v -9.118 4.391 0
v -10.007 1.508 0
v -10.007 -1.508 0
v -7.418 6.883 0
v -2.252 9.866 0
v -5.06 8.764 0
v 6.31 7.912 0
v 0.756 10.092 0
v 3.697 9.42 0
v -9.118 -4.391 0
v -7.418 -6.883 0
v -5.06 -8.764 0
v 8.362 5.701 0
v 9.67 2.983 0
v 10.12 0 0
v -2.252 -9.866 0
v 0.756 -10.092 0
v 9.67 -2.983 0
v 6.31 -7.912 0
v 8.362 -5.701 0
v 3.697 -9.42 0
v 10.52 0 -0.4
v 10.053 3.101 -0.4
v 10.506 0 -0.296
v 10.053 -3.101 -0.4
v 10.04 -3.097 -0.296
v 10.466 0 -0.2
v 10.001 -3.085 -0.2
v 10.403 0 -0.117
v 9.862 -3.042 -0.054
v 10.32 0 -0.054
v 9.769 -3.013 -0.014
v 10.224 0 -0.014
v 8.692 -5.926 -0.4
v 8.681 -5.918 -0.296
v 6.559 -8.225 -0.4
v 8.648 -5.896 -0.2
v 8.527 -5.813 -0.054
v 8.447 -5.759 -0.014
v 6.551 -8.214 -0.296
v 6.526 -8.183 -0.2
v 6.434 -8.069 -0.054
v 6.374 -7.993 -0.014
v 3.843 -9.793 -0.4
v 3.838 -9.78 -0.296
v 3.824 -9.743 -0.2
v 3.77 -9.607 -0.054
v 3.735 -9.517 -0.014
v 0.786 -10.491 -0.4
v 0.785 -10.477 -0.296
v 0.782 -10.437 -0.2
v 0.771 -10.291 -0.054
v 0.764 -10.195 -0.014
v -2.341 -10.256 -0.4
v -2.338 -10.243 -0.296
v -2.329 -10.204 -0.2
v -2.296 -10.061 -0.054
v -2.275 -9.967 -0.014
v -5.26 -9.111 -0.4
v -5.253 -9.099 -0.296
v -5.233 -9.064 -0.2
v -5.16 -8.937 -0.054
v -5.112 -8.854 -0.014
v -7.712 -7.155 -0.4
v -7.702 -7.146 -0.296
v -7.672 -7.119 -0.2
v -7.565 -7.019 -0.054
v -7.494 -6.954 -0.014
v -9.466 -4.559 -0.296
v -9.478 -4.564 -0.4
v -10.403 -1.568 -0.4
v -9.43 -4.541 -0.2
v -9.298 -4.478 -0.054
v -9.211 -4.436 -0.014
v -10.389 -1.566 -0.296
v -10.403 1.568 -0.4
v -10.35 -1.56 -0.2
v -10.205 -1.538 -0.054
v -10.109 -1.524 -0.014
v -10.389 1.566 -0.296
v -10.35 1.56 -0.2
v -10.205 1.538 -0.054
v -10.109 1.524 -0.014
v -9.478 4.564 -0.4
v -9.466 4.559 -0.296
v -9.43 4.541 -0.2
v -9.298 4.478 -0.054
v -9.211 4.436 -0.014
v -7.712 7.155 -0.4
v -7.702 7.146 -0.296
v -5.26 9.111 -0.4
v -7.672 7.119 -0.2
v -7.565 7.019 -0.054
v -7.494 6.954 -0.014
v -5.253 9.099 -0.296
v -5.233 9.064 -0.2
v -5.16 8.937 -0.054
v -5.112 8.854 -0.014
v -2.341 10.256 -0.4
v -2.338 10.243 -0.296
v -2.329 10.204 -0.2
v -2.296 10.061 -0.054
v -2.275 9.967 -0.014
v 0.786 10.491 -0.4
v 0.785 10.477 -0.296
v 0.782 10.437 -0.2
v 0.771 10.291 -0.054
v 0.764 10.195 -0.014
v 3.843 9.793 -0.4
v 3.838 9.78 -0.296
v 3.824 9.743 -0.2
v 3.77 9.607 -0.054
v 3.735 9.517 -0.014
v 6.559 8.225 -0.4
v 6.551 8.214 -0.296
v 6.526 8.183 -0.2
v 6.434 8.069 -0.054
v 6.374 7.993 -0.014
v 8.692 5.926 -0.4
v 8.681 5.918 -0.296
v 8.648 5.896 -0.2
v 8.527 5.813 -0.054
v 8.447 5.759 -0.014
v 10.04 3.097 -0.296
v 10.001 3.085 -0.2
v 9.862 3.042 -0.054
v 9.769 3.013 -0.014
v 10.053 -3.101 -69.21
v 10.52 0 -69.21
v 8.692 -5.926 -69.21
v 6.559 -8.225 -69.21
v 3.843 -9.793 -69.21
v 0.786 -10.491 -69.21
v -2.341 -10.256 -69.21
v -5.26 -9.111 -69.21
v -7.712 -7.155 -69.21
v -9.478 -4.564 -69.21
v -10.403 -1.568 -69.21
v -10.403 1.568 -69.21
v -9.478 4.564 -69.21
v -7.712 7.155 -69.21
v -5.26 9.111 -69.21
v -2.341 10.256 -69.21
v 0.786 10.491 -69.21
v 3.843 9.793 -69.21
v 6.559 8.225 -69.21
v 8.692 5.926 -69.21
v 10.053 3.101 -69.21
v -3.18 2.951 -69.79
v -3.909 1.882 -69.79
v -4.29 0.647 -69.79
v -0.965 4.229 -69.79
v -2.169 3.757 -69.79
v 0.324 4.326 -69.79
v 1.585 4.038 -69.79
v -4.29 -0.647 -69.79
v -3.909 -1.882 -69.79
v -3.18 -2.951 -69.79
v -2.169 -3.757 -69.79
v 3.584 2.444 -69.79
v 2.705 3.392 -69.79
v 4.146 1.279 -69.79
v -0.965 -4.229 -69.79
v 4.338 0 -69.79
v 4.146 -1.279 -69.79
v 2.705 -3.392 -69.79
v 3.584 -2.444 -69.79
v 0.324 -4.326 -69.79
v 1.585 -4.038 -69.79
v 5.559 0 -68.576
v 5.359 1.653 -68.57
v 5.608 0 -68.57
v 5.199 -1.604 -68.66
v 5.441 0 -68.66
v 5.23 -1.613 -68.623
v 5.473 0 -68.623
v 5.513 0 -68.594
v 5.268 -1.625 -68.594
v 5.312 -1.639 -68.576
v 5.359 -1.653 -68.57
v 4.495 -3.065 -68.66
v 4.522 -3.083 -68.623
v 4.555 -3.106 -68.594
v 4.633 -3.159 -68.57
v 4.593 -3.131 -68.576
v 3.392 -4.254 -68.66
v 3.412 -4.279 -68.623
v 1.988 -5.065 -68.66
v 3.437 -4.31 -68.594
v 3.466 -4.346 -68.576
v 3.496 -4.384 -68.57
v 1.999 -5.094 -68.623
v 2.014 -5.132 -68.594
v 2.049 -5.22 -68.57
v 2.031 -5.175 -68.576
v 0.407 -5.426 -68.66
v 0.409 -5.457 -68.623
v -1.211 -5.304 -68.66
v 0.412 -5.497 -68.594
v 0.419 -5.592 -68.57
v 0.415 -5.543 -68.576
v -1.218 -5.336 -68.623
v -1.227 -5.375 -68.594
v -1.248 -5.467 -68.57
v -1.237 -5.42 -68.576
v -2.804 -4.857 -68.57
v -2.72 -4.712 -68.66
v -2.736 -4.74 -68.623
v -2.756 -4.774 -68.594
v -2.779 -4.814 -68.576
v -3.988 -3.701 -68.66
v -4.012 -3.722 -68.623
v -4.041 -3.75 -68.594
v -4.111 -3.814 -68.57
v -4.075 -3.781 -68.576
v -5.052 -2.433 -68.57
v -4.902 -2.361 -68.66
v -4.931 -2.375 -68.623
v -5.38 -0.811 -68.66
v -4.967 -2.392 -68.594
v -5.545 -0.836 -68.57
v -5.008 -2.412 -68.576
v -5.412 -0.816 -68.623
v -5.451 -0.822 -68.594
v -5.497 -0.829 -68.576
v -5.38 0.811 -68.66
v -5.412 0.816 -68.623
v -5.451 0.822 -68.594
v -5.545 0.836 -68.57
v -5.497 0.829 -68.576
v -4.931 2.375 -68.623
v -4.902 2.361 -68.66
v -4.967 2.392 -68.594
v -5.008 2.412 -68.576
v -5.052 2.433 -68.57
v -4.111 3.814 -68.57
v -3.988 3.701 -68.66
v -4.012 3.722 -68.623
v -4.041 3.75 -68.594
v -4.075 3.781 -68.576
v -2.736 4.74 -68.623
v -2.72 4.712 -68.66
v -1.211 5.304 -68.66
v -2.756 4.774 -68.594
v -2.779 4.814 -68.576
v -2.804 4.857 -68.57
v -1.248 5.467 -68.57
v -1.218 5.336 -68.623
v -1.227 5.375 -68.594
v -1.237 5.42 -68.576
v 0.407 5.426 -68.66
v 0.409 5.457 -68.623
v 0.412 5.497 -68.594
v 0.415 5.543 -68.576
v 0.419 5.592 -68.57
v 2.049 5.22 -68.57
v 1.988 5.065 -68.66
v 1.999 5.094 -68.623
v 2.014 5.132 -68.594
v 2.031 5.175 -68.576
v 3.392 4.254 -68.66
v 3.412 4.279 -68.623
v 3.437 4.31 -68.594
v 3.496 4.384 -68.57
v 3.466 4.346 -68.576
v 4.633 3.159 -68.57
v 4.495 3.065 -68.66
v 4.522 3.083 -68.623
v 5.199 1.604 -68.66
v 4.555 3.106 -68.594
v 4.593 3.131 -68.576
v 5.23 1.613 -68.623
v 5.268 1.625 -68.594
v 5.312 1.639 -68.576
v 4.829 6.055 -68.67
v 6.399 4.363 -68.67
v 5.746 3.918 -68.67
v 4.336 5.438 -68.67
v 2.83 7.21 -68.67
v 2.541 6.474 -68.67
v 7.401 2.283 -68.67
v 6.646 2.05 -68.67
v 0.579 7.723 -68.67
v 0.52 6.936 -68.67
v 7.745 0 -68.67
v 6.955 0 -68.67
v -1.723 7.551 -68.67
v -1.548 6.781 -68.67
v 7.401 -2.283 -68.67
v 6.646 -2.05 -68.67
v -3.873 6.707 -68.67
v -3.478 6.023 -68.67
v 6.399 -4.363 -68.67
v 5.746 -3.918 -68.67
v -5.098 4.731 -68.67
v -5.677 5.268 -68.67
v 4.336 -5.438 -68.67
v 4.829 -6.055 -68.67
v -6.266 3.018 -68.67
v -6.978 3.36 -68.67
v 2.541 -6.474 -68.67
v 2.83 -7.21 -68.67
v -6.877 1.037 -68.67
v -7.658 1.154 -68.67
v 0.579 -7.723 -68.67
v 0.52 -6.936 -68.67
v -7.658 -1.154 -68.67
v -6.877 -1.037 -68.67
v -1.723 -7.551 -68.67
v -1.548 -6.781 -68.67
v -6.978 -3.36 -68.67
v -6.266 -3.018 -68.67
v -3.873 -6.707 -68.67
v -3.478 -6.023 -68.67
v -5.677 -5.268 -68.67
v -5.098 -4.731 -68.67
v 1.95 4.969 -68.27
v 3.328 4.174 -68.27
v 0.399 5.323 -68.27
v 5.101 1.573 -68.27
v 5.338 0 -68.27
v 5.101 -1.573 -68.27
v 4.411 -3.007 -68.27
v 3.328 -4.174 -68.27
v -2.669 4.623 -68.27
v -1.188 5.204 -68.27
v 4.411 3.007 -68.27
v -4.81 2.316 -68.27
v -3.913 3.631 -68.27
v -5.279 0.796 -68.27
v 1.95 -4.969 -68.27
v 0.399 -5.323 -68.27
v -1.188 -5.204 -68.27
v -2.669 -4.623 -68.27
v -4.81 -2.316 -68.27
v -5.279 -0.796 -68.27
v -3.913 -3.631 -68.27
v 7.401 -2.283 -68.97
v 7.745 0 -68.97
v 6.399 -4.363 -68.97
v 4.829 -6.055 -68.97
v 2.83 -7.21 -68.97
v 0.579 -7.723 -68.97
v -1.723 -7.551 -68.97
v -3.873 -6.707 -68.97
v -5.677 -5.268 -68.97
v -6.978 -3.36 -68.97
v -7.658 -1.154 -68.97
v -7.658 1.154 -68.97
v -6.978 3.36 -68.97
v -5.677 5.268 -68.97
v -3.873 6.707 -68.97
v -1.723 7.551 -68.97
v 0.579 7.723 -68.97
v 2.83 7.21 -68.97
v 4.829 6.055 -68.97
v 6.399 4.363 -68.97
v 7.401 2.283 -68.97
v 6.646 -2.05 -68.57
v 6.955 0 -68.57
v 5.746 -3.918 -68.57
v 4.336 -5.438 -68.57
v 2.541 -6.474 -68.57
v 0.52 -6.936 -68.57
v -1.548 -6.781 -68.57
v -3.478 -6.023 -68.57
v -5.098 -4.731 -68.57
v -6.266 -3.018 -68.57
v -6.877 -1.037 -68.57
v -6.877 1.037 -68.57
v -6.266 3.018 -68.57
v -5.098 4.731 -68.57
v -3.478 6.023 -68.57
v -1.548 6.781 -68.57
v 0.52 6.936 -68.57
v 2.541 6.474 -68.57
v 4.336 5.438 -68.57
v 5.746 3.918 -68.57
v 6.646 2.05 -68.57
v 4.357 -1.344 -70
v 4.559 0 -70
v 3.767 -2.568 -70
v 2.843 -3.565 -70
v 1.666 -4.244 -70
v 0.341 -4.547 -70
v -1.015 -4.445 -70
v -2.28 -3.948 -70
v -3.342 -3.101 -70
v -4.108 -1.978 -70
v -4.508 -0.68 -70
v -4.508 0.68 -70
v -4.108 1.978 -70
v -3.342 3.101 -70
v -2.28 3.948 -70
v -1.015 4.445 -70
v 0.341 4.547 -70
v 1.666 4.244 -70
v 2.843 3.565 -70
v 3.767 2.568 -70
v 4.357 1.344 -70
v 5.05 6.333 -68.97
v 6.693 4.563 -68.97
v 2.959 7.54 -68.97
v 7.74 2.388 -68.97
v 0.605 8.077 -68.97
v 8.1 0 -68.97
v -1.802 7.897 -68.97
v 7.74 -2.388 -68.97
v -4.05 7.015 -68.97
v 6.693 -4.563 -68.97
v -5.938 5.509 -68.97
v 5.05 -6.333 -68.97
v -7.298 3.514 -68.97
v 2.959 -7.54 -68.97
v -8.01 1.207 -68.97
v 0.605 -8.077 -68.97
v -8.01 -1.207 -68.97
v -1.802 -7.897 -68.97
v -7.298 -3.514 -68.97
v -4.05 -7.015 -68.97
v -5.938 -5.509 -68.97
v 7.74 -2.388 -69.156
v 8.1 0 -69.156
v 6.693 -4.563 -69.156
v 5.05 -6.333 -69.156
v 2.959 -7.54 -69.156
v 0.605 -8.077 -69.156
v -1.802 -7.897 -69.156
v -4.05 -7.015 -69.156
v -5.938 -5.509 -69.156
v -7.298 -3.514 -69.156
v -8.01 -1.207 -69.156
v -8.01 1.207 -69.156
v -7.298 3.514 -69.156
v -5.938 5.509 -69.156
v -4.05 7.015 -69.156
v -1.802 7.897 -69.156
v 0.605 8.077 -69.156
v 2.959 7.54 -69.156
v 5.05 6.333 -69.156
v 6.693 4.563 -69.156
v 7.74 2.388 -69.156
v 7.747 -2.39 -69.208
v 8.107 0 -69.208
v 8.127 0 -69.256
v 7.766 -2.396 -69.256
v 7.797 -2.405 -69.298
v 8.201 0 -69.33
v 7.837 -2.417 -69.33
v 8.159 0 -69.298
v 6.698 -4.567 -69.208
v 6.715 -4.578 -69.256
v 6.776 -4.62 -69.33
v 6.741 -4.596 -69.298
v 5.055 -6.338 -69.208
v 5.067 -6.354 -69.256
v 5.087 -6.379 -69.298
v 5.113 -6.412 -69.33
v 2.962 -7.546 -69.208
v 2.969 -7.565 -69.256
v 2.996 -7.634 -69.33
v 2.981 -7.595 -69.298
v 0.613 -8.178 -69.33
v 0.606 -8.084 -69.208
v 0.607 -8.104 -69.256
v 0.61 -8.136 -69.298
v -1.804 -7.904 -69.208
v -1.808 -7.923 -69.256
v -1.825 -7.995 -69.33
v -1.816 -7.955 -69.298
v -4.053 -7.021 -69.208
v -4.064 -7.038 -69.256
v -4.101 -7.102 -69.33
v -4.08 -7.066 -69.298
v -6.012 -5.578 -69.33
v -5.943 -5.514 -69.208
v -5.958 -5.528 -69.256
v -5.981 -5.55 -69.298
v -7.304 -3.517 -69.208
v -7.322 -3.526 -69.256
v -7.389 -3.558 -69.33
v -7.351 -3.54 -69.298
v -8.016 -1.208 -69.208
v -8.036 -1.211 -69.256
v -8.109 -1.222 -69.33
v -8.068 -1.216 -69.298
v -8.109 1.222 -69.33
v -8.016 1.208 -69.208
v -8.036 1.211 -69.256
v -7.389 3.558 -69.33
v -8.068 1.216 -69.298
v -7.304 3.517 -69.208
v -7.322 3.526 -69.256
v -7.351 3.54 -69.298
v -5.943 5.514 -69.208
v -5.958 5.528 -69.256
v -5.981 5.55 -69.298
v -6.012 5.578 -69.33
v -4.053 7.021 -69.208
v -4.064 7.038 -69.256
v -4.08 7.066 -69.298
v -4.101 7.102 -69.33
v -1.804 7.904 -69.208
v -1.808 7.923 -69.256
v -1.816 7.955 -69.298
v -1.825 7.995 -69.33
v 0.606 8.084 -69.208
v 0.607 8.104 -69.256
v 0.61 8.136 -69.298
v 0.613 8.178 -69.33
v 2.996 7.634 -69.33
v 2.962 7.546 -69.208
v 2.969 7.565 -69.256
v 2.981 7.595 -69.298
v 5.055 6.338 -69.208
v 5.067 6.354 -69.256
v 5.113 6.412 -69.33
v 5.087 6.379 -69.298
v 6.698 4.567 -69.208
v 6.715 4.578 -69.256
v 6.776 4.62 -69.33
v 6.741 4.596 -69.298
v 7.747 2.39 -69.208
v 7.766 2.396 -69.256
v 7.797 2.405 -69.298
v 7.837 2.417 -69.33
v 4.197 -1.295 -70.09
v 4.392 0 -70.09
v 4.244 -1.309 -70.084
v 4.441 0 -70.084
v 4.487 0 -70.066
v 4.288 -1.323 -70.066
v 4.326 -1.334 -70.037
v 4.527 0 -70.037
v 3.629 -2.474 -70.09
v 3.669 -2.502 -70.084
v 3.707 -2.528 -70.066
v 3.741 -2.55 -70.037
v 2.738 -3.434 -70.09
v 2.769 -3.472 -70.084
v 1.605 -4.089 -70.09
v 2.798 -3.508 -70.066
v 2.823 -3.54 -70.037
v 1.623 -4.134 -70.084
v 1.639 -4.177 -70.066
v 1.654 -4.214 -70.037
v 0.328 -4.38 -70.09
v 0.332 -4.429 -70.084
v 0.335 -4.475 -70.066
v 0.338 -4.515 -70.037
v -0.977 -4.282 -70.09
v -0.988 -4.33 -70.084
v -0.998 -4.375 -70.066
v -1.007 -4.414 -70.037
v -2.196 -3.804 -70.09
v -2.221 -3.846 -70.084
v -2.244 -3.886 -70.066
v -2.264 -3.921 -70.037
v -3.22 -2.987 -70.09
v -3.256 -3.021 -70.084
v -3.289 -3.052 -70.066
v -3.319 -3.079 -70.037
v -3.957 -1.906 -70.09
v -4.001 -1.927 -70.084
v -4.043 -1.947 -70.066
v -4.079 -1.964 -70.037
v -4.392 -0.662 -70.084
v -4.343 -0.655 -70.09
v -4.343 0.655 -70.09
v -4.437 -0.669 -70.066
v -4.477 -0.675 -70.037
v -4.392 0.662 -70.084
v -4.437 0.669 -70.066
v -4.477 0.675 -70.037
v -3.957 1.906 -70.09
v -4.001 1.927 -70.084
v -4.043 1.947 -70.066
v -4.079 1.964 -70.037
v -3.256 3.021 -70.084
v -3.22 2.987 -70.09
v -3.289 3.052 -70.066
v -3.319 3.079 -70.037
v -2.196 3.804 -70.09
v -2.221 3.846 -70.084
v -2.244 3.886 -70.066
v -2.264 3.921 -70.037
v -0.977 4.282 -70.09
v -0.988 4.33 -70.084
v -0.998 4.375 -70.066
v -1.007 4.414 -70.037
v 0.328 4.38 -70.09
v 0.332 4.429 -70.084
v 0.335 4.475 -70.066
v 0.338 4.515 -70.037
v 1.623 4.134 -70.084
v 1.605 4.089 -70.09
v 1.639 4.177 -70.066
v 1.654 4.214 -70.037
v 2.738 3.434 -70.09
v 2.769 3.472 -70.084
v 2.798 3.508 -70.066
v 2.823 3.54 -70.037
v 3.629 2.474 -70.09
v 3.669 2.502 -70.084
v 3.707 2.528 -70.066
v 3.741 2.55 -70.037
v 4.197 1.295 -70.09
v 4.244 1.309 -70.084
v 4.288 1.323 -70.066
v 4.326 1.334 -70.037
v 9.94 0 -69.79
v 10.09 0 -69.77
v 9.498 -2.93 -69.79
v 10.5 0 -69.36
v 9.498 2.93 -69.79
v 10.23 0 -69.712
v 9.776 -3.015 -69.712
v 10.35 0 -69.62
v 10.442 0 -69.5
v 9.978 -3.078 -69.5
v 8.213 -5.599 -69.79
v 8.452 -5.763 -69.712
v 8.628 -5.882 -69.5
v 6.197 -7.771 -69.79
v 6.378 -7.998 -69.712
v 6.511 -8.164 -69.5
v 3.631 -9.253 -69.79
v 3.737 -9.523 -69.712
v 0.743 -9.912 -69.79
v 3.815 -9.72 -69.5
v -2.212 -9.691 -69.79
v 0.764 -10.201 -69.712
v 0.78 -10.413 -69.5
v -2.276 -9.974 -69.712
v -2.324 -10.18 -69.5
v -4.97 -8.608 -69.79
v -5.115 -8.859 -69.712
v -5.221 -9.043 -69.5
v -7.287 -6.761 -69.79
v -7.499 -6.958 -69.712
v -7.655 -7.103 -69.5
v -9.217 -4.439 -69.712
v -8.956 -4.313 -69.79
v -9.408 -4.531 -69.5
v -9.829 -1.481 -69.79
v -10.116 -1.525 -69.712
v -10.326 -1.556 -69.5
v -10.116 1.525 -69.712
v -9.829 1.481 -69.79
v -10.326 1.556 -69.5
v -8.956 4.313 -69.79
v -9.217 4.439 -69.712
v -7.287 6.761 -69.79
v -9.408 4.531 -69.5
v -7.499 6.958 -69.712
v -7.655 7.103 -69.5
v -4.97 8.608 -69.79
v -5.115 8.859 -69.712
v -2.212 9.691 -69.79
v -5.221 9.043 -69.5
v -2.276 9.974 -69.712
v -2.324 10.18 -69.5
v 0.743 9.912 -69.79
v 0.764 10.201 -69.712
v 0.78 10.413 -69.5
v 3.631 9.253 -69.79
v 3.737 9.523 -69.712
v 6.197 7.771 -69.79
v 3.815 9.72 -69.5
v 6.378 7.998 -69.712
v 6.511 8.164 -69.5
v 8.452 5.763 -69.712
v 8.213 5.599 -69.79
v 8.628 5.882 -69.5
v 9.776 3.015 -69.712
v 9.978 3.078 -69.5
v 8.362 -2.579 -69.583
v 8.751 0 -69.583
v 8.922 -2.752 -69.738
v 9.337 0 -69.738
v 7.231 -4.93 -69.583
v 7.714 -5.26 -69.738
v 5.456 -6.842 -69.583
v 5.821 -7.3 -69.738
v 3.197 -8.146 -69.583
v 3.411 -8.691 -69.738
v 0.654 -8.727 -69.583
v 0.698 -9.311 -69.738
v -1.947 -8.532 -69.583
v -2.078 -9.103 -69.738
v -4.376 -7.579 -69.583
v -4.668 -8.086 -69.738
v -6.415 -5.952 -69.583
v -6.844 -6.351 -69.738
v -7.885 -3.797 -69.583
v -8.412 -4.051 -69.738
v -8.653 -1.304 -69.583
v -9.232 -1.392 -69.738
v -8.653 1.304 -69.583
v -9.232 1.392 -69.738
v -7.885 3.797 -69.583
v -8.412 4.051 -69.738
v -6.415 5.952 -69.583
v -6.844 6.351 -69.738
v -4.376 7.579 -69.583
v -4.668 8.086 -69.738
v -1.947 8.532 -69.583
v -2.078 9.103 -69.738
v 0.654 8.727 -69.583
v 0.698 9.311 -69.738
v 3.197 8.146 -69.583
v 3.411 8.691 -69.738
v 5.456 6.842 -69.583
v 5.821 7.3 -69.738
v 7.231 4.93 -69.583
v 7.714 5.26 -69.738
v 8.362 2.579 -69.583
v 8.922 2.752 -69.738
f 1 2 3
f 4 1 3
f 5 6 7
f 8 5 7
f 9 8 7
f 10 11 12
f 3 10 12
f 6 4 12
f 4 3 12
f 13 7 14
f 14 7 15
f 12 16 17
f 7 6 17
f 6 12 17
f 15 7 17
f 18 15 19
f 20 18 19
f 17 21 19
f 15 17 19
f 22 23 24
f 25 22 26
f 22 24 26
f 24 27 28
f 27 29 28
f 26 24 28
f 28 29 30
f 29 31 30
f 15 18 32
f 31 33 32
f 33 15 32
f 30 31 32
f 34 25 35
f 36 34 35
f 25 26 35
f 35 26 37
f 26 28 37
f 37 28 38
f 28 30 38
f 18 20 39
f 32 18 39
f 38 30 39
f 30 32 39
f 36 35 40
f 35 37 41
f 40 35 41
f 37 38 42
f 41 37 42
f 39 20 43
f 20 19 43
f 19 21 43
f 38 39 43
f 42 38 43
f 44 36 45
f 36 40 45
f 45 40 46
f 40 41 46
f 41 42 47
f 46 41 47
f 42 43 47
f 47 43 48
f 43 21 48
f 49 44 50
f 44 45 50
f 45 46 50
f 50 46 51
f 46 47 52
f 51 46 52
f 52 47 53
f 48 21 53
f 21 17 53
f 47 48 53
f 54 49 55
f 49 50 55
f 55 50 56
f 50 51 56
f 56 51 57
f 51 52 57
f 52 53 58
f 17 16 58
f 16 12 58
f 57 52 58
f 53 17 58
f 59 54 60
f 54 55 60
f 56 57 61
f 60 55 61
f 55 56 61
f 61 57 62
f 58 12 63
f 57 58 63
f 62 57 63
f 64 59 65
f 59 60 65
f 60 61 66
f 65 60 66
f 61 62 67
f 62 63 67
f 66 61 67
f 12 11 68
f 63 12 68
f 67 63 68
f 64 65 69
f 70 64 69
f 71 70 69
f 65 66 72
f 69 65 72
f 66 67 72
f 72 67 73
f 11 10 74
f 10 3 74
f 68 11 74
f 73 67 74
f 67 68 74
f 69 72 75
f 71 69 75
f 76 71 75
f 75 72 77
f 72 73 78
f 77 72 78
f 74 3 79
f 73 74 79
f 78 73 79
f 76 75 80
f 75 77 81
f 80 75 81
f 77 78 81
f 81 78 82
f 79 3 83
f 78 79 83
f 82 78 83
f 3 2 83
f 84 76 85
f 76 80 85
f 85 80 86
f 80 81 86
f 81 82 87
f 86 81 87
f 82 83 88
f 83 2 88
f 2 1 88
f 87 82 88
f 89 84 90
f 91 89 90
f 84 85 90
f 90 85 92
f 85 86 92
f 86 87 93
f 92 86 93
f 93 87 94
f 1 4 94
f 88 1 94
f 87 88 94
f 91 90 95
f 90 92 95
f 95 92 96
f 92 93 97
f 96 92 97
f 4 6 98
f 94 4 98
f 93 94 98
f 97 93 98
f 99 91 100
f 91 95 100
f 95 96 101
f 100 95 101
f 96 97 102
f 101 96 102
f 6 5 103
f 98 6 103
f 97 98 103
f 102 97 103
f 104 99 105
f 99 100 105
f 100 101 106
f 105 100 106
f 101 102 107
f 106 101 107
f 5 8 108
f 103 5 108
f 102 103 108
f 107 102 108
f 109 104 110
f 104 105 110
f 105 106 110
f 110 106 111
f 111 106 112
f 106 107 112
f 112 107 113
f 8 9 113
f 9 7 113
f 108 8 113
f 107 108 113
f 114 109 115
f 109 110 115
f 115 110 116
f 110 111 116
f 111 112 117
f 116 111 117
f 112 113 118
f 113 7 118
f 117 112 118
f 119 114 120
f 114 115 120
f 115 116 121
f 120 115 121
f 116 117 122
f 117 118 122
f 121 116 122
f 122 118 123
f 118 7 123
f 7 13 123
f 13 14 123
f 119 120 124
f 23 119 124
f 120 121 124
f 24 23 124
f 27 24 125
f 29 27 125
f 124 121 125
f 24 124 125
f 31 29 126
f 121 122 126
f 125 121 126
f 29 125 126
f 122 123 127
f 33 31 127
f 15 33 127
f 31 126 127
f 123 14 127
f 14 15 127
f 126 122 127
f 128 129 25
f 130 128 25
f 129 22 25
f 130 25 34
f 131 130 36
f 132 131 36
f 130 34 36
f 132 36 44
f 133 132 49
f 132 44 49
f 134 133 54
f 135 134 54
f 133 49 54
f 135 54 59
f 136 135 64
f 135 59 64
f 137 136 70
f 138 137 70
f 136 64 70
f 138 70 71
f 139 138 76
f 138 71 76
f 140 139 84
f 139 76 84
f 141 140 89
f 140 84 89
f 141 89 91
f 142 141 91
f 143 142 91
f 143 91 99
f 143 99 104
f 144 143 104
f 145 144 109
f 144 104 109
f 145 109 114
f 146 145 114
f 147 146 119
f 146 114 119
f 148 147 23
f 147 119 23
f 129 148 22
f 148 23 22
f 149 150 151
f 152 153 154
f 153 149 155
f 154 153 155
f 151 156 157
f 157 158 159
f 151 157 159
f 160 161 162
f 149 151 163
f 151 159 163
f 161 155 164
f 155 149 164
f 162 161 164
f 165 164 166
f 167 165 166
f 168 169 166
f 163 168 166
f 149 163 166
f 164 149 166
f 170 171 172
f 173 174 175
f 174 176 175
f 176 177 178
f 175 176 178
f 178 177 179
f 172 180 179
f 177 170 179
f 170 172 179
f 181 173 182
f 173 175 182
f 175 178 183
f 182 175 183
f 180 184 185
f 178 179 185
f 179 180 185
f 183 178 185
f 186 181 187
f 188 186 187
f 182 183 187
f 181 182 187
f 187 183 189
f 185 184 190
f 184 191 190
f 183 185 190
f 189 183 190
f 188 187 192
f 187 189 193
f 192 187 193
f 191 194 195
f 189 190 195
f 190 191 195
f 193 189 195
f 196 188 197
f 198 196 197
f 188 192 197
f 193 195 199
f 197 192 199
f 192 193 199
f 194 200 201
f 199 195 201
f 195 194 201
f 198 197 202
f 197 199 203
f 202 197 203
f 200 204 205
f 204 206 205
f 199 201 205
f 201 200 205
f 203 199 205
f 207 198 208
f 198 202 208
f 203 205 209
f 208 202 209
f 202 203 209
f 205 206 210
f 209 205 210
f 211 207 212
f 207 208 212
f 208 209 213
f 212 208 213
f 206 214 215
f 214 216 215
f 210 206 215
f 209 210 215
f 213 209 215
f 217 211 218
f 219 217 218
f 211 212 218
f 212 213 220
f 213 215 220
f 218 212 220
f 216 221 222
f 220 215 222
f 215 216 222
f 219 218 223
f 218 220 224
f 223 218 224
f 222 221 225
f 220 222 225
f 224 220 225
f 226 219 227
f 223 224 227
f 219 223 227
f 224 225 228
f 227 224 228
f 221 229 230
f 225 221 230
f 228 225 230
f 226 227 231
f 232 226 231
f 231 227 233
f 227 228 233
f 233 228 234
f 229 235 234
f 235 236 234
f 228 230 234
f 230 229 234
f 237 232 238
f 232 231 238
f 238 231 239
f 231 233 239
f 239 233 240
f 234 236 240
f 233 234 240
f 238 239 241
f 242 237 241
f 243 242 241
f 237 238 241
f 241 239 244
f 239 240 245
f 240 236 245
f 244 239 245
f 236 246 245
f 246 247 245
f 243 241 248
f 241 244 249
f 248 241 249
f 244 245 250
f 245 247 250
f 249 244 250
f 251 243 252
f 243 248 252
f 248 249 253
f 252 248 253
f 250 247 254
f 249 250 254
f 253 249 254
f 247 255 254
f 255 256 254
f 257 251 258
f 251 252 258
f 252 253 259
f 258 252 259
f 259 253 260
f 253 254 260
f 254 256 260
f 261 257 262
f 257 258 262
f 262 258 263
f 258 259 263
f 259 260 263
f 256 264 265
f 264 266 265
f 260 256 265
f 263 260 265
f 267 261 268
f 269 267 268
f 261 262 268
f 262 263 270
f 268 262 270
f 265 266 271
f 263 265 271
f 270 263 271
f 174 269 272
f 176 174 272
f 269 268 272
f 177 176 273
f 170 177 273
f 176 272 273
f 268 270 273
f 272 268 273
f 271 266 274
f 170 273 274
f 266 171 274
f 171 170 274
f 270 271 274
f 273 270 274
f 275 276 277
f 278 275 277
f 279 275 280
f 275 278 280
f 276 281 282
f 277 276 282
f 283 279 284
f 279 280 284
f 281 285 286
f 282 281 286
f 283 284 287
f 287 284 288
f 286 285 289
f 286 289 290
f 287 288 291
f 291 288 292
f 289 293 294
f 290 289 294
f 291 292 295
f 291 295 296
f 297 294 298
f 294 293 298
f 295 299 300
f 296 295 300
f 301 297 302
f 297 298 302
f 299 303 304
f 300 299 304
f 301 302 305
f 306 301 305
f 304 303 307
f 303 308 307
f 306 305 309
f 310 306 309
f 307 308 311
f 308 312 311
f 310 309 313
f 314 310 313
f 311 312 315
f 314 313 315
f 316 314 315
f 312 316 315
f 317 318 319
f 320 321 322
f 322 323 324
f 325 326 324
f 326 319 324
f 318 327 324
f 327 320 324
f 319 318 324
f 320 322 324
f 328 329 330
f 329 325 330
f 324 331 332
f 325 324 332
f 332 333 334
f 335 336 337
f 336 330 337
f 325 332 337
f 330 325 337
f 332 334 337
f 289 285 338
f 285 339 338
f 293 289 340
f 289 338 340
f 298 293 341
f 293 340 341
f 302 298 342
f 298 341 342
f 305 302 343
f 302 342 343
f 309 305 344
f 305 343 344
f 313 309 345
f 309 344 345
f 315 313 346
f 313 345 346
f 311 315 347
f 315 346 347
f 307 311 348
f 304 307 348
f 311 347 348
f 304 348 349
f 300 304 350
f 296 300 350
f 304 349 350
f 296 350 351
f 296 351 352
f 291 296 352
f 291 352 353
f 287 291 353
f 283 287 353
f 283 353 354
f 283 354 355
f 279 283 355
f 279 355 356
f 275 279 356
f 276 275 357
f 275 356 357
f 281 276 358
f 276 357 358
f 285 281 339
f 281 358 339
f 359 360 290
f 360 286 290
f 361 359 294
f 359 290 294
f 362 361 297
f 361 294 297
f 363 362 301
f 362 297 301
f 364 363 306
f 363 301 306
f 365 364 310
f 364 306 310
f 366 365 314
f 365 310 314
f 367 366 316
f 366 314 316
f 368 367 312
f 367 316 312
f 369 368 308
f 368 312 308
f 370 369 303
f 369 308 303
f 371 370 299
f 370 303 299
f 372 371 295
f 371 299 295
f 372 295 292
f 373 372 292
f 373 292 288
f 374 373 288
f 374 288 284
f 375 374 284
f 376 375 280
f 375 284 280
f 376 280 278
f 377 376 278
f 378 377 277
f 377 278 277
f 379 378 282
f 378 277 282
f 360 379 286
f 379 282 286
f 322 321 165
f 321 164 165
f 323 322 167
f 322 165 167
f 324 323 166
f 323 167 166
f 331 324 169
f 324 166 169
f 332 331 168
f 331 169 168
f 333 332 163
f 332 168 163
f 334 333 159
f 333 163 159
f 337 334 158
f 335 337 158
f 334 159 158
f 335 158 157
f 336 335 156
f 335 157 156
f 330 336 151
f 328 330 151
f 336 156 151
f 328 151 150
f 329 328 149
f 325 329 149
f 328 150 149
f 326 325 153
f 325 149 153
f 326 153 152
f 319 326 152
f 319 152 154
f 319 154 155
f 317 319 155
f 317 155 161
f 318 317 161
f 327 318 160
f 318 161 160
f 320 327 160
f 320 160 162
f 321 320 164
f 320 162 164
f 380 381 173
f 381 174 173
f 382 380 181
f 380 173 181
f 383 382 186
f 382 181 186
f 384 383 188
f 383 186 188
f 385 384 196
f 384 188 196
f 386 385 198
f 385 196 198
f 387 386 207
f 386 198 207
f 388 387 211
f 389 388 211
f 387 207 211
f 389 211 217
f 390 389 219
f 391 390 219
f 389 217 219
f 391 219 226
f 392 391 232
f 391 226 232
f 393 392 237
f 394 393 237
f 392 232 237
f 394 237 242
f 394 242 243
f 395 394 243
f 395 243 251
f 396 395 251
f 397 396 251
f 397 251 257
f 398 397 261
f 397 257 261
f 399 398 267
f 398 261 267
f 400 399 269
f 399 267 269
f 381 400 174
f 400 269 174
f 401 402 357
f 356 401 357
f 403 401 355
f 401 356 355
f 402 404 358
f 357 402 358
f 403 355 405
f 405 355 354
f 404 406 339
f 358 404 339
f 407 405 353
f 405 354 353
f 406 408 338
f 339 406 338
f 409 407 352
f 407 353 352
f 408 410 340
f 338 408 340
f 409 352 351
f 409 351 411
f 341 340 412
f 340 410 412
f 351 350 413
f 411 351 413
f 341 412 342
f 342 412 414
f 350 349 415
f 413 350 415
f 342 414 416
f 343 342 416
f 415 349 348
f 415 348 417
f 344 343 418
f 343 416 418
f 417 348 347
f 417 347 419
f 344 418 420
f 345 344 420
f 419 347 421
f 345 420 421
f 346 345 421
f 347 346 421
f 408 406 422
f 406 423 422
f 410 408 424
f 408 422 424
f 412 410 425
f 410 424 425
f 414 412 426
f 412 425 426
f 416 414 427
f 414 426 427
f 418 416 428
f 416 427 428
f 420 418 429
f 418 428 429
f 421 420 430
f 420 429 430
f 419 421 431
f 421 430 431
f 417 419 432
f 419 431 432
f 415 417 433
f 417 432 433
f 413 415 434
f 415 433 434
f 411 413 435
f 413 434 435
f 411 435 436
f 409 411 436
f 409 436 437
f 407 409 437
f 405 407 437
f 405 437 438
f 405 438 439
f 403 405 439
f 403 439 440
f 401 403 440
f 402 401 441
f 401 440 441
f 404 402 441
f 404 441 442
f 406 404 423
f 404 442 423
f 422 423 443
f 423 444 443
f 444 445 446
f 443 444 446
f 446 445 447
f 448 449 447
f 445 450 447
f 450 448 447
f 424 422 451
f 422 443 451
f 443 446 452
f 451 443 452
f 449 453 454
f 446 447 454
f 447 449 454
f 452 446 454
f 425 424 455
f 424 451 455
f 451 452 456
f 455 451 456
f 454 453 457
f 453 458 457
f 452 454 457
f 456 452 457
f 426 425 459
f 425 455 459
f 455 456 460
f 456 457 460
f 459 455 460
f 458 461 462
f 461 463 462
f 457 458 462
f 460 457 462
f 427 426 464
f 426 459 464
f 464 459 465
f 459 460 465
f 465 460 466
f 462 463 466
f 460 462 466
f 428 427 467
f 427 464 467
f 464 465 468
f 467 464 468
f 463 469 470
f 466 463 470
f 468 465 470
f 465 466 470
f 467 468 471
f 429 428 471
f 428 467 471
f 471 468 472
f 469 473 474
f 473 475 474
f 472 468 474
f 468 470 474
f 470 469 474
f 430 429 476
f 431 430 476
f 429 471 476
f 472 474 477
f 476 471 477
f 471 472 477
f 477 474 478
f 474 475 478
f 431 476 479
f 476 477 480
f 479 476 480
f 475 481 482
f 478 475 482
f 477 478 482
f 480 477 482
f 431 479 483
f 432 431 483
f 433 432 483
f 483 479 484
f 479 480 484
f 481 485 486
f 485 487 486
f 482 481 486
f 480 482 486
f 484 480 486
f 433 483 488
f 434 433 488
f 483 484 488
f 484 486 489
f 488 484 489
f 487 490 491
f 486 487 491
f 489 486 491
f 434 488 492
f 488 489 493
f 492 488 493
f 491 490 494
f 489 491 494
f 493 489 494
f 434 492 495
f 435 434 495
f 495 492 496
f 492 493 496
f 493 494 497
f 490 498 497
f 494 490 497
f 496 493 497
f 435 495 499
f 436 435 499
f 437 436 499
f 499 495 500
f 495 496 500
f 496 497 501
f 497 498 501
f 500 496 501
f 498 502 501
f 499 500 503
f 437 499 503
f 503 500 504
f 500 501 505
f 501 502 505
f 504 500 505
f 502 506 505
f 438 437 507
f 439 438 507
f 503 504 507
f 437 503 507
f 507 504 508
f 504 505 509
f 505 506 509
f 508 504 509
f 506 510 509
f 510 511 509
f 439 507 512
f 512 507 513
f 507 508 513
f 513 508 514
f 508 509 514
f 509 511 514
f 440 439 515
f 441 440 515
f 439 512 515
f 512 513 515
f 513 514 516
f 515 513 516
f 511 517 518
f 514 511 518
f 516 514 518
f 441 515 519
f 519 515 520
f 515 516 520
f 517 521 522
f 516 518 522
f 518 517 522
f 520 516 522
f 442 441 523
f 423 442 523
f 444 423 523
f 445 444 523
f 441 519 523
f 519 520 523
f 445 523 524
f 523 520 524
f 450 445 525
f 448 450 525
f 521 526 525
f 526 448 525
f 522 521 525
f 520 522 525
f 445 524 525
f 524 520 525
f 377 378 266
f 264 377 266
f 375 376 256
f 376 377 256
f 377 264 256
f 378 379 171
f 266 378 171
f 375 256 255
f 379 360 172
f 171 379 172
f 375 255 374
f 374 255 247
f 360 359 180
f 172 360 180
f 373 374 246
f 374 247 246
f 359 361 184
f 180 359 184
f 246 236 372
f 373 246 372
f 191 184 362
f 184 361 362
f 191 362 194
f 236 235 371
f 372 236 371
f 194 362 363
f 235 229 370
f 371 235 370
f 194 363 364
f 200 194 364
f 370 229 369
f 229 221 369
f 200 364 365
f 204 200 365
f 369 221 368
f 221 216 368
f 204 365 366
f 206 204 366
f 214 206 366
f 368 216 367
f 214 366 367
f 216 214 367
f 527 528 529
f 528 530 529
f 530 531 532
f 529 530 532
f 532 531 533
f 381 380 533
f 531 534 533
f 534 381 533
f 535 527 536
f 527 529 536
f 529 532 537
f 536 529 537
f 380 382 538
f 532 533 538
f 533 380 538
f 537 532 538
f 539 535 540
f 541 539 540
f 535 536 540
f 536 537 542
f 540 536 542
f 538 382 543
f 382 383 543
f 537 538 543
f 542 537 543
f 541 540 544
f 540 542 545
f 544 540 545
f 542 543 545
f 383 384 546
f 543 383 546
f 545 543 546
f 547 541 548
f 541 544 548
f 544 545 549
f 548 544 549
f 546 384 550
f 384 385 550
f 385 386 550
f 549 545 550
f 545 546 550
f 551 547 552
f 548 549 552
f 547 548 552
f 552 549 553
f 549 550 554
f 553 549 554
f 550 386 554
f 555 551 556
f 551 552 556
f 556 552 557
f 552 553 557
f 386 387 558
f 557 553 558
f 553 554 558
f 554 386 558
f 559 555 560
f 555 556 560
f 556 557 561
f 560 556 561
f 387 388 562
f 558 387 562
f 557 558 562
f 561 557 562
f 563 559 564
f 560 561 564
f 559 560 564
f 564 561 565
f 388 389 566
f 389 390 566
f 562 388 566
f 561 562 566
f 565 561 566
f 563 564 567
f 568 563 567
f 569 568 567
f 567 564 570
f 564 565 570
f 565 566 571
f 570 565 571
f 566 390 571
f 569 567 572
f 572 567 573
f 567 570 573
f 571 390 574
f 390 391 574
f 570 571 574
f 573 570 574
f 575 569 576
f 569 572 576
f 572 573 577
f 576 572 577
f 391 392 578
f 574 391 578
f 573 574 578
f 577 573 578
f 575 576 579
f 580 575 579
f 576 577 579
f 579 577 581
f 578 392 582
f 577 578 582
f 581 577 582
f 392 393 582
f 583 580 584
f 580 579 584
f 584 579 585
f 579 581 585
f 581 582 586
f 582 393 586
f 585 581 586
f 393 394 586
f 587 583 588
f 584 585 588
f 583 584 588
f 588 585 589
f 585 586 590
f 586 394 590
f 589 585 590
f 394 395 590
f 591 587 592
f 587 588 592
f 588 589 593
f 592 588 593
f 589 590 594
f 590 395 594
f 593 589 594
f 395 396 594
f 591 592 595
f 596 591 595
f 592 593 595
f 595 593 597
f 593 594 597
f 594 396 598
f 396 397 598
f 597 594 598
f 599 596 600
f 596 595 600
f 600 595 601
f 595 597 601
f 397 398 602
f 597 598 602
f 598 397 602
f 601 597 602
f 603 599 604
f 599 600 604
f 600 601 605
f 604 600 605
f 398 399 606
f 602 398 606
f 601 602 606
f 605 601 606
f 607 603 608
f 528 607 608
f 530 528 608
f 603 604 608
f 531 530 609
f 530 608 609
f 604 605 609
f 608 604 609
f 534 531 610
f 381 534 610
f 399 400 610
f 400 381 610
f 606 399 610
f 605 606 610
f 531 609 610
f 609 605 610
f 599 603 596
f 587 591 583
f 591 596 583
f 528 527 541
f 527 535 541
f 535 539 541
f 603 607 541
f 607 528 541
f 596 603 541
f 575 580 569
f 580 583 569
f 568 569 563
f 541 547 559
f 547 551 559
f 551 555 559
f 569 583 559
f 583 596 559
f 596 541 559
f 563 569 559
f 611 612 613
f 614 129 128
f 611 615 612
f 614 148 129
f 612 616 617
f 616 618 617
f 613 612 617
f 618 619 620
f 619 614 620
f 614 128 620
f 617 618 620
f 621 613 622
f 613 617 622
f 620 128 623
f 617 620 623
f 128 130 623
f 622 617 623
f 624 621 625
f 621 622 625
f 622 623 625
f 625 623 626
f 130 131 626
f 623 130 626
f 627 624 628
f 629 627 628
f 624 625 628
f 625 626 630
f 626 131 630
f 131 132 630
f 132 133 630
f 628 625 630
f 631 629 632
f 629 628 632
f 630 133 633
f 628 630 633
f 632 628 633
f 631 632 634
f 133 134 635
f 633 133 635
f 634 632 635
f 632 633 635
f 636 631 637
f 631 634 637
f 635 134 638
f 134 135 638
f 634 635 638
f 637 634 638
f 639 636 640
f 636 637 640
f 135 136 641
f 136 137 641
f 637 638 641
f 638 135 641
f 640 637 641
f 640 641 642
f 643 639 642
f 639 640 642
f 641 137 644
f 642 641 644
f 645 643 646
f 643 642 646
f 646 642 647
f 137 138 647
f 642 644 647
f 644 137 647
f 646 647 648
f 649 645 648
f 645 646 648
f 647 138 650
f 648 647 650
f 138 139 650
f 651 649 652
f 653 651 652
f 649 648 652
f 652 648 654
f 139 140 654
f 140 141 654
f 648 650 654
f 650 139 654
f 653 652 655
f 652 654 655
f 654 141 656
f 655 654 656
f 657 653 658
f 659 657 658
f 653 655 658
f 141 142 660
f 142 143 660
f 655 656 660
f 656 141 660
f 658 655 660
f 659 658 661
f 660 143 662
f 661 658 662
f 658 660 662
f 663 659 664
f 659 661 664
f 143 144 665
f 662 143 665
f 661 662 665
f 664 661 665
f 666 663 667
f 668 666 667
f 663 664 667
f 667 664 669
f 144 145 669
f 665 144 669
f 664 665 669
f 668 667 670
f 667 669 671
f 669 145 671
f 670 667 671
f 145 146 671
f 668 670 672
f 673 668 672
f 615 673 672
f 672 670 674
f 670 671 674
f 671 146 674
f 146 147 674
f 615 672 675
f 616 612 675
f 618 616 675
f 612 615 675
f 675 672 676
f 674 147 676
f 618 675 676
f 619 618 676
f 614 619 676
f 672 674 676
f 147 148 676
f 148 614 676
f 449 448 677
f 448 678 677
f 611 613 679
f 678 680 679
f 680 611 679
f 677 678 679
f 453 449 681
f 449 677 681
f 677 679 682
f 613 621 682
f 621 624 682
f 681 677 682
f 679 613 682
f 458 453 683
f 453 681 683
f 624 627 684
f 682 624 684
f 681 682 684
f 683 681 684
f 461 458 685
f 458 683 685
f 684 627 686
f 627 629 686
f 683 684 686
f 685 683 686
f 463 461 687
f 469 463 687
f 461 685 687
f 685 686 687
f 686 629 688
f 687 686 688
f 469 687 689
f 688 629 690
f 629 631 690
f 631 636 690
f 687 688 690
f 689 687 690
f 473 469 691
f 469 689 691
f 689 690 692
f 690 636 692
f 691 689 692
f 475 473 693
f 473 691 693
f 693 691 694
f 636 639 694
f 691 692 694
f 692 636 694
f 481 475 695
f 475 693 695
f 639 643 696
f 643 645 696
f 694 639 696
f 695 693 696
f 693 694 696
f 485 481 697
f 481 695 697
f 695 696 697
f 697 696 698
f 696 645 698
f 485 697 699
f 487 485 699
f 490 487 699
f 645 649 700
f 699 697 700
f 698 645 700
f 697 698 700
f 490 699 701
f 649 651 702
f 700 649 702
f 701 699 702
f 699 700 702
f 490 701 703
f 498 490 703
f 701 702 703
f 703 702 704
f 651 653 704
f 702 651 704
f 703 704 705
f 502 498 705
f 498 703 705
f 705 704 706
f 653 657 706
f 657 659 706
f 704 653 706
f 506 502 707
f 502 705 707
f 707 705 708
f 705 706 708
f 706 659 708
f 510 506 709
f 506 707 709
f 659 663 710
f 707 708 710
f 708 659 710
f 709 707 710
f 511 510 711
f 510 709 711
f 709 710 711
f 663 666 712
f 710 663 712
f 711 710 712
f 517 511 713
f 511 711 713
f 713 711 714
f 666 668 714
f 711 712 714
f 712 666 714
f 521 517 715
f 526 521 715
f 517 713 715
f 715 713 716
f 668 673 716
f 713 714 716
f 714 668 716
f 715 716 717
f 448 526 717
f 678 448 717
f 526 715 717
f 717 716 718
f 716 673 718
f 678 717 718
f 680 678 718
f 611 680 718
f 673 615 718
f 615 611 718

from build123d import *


with BuildPart() as part:
    # Sketch1 → Revolve1 (revolve)
    with BuildSketch(Plane(origin=(0, 0, 0), x_dir=(1, 0, 0), z_dir=(0, 1, 0))):
        with BuildLine():
            Line((0, 70.09), (4.39217757, 70.09))
            ThreePointArc((4.39217757, 70.09), (4.487086316, 70.066046386), (4.559260987, 69.9999233))
            Line((4.559260987, 69.9999233), (5.440739013, 68.6600767))
            ThreePointArc((5.440739013, 68.6600767), (5.512913684, 68.593953614), (5.60782243, 68.57))
            Line((5.60782243, 68.57), (6.955, 68.57))
            Line((6.955, 68.57), (6.955, 68.67))
            Line((6.955, 68.67), (7.745, 68.67))
            Line((7.745, 68.67), (7.745, 68.97))
            Line((7.745, 68.97), (8.1, 68.97))
            Line((8.1, 68.97), (8.1, 69.15596492))
            ThreePointArc((8.1, 69.15596492), (8.127103293, 69.256497147), (8.201067285, 69.32978183))
            ThreePointArc((8.201067285, 69.32978183), (9.040599123, 69.672998391), (9.94, 69.79))
            ThreePointArc((9.94, 69.79), (10.350121933, 69.620121933), (10.52, 69.21))
            Line((10.52, 69.21), (10.52, 0.4))
            ThreePointArc((10.52, 0.4), (10.402842712, 0.117157288), (10.12, 0))
            Line((10.12, 0), (0, 0))
            Line((0, 0), (0, 68.27))
            Line((0, 68.27), (5.338266355, 68.27))
            Line((5.338266355, 68.27), (4.338266355, 69.79))
            Line((4.338266355, 69.79), (0, 69.79))
            Line((0, 69.79), (0, 70.09))
        make_face()
    revolve(axis=Axis((0, 0, 0), (0, 0, -1)))


solid = part.part
